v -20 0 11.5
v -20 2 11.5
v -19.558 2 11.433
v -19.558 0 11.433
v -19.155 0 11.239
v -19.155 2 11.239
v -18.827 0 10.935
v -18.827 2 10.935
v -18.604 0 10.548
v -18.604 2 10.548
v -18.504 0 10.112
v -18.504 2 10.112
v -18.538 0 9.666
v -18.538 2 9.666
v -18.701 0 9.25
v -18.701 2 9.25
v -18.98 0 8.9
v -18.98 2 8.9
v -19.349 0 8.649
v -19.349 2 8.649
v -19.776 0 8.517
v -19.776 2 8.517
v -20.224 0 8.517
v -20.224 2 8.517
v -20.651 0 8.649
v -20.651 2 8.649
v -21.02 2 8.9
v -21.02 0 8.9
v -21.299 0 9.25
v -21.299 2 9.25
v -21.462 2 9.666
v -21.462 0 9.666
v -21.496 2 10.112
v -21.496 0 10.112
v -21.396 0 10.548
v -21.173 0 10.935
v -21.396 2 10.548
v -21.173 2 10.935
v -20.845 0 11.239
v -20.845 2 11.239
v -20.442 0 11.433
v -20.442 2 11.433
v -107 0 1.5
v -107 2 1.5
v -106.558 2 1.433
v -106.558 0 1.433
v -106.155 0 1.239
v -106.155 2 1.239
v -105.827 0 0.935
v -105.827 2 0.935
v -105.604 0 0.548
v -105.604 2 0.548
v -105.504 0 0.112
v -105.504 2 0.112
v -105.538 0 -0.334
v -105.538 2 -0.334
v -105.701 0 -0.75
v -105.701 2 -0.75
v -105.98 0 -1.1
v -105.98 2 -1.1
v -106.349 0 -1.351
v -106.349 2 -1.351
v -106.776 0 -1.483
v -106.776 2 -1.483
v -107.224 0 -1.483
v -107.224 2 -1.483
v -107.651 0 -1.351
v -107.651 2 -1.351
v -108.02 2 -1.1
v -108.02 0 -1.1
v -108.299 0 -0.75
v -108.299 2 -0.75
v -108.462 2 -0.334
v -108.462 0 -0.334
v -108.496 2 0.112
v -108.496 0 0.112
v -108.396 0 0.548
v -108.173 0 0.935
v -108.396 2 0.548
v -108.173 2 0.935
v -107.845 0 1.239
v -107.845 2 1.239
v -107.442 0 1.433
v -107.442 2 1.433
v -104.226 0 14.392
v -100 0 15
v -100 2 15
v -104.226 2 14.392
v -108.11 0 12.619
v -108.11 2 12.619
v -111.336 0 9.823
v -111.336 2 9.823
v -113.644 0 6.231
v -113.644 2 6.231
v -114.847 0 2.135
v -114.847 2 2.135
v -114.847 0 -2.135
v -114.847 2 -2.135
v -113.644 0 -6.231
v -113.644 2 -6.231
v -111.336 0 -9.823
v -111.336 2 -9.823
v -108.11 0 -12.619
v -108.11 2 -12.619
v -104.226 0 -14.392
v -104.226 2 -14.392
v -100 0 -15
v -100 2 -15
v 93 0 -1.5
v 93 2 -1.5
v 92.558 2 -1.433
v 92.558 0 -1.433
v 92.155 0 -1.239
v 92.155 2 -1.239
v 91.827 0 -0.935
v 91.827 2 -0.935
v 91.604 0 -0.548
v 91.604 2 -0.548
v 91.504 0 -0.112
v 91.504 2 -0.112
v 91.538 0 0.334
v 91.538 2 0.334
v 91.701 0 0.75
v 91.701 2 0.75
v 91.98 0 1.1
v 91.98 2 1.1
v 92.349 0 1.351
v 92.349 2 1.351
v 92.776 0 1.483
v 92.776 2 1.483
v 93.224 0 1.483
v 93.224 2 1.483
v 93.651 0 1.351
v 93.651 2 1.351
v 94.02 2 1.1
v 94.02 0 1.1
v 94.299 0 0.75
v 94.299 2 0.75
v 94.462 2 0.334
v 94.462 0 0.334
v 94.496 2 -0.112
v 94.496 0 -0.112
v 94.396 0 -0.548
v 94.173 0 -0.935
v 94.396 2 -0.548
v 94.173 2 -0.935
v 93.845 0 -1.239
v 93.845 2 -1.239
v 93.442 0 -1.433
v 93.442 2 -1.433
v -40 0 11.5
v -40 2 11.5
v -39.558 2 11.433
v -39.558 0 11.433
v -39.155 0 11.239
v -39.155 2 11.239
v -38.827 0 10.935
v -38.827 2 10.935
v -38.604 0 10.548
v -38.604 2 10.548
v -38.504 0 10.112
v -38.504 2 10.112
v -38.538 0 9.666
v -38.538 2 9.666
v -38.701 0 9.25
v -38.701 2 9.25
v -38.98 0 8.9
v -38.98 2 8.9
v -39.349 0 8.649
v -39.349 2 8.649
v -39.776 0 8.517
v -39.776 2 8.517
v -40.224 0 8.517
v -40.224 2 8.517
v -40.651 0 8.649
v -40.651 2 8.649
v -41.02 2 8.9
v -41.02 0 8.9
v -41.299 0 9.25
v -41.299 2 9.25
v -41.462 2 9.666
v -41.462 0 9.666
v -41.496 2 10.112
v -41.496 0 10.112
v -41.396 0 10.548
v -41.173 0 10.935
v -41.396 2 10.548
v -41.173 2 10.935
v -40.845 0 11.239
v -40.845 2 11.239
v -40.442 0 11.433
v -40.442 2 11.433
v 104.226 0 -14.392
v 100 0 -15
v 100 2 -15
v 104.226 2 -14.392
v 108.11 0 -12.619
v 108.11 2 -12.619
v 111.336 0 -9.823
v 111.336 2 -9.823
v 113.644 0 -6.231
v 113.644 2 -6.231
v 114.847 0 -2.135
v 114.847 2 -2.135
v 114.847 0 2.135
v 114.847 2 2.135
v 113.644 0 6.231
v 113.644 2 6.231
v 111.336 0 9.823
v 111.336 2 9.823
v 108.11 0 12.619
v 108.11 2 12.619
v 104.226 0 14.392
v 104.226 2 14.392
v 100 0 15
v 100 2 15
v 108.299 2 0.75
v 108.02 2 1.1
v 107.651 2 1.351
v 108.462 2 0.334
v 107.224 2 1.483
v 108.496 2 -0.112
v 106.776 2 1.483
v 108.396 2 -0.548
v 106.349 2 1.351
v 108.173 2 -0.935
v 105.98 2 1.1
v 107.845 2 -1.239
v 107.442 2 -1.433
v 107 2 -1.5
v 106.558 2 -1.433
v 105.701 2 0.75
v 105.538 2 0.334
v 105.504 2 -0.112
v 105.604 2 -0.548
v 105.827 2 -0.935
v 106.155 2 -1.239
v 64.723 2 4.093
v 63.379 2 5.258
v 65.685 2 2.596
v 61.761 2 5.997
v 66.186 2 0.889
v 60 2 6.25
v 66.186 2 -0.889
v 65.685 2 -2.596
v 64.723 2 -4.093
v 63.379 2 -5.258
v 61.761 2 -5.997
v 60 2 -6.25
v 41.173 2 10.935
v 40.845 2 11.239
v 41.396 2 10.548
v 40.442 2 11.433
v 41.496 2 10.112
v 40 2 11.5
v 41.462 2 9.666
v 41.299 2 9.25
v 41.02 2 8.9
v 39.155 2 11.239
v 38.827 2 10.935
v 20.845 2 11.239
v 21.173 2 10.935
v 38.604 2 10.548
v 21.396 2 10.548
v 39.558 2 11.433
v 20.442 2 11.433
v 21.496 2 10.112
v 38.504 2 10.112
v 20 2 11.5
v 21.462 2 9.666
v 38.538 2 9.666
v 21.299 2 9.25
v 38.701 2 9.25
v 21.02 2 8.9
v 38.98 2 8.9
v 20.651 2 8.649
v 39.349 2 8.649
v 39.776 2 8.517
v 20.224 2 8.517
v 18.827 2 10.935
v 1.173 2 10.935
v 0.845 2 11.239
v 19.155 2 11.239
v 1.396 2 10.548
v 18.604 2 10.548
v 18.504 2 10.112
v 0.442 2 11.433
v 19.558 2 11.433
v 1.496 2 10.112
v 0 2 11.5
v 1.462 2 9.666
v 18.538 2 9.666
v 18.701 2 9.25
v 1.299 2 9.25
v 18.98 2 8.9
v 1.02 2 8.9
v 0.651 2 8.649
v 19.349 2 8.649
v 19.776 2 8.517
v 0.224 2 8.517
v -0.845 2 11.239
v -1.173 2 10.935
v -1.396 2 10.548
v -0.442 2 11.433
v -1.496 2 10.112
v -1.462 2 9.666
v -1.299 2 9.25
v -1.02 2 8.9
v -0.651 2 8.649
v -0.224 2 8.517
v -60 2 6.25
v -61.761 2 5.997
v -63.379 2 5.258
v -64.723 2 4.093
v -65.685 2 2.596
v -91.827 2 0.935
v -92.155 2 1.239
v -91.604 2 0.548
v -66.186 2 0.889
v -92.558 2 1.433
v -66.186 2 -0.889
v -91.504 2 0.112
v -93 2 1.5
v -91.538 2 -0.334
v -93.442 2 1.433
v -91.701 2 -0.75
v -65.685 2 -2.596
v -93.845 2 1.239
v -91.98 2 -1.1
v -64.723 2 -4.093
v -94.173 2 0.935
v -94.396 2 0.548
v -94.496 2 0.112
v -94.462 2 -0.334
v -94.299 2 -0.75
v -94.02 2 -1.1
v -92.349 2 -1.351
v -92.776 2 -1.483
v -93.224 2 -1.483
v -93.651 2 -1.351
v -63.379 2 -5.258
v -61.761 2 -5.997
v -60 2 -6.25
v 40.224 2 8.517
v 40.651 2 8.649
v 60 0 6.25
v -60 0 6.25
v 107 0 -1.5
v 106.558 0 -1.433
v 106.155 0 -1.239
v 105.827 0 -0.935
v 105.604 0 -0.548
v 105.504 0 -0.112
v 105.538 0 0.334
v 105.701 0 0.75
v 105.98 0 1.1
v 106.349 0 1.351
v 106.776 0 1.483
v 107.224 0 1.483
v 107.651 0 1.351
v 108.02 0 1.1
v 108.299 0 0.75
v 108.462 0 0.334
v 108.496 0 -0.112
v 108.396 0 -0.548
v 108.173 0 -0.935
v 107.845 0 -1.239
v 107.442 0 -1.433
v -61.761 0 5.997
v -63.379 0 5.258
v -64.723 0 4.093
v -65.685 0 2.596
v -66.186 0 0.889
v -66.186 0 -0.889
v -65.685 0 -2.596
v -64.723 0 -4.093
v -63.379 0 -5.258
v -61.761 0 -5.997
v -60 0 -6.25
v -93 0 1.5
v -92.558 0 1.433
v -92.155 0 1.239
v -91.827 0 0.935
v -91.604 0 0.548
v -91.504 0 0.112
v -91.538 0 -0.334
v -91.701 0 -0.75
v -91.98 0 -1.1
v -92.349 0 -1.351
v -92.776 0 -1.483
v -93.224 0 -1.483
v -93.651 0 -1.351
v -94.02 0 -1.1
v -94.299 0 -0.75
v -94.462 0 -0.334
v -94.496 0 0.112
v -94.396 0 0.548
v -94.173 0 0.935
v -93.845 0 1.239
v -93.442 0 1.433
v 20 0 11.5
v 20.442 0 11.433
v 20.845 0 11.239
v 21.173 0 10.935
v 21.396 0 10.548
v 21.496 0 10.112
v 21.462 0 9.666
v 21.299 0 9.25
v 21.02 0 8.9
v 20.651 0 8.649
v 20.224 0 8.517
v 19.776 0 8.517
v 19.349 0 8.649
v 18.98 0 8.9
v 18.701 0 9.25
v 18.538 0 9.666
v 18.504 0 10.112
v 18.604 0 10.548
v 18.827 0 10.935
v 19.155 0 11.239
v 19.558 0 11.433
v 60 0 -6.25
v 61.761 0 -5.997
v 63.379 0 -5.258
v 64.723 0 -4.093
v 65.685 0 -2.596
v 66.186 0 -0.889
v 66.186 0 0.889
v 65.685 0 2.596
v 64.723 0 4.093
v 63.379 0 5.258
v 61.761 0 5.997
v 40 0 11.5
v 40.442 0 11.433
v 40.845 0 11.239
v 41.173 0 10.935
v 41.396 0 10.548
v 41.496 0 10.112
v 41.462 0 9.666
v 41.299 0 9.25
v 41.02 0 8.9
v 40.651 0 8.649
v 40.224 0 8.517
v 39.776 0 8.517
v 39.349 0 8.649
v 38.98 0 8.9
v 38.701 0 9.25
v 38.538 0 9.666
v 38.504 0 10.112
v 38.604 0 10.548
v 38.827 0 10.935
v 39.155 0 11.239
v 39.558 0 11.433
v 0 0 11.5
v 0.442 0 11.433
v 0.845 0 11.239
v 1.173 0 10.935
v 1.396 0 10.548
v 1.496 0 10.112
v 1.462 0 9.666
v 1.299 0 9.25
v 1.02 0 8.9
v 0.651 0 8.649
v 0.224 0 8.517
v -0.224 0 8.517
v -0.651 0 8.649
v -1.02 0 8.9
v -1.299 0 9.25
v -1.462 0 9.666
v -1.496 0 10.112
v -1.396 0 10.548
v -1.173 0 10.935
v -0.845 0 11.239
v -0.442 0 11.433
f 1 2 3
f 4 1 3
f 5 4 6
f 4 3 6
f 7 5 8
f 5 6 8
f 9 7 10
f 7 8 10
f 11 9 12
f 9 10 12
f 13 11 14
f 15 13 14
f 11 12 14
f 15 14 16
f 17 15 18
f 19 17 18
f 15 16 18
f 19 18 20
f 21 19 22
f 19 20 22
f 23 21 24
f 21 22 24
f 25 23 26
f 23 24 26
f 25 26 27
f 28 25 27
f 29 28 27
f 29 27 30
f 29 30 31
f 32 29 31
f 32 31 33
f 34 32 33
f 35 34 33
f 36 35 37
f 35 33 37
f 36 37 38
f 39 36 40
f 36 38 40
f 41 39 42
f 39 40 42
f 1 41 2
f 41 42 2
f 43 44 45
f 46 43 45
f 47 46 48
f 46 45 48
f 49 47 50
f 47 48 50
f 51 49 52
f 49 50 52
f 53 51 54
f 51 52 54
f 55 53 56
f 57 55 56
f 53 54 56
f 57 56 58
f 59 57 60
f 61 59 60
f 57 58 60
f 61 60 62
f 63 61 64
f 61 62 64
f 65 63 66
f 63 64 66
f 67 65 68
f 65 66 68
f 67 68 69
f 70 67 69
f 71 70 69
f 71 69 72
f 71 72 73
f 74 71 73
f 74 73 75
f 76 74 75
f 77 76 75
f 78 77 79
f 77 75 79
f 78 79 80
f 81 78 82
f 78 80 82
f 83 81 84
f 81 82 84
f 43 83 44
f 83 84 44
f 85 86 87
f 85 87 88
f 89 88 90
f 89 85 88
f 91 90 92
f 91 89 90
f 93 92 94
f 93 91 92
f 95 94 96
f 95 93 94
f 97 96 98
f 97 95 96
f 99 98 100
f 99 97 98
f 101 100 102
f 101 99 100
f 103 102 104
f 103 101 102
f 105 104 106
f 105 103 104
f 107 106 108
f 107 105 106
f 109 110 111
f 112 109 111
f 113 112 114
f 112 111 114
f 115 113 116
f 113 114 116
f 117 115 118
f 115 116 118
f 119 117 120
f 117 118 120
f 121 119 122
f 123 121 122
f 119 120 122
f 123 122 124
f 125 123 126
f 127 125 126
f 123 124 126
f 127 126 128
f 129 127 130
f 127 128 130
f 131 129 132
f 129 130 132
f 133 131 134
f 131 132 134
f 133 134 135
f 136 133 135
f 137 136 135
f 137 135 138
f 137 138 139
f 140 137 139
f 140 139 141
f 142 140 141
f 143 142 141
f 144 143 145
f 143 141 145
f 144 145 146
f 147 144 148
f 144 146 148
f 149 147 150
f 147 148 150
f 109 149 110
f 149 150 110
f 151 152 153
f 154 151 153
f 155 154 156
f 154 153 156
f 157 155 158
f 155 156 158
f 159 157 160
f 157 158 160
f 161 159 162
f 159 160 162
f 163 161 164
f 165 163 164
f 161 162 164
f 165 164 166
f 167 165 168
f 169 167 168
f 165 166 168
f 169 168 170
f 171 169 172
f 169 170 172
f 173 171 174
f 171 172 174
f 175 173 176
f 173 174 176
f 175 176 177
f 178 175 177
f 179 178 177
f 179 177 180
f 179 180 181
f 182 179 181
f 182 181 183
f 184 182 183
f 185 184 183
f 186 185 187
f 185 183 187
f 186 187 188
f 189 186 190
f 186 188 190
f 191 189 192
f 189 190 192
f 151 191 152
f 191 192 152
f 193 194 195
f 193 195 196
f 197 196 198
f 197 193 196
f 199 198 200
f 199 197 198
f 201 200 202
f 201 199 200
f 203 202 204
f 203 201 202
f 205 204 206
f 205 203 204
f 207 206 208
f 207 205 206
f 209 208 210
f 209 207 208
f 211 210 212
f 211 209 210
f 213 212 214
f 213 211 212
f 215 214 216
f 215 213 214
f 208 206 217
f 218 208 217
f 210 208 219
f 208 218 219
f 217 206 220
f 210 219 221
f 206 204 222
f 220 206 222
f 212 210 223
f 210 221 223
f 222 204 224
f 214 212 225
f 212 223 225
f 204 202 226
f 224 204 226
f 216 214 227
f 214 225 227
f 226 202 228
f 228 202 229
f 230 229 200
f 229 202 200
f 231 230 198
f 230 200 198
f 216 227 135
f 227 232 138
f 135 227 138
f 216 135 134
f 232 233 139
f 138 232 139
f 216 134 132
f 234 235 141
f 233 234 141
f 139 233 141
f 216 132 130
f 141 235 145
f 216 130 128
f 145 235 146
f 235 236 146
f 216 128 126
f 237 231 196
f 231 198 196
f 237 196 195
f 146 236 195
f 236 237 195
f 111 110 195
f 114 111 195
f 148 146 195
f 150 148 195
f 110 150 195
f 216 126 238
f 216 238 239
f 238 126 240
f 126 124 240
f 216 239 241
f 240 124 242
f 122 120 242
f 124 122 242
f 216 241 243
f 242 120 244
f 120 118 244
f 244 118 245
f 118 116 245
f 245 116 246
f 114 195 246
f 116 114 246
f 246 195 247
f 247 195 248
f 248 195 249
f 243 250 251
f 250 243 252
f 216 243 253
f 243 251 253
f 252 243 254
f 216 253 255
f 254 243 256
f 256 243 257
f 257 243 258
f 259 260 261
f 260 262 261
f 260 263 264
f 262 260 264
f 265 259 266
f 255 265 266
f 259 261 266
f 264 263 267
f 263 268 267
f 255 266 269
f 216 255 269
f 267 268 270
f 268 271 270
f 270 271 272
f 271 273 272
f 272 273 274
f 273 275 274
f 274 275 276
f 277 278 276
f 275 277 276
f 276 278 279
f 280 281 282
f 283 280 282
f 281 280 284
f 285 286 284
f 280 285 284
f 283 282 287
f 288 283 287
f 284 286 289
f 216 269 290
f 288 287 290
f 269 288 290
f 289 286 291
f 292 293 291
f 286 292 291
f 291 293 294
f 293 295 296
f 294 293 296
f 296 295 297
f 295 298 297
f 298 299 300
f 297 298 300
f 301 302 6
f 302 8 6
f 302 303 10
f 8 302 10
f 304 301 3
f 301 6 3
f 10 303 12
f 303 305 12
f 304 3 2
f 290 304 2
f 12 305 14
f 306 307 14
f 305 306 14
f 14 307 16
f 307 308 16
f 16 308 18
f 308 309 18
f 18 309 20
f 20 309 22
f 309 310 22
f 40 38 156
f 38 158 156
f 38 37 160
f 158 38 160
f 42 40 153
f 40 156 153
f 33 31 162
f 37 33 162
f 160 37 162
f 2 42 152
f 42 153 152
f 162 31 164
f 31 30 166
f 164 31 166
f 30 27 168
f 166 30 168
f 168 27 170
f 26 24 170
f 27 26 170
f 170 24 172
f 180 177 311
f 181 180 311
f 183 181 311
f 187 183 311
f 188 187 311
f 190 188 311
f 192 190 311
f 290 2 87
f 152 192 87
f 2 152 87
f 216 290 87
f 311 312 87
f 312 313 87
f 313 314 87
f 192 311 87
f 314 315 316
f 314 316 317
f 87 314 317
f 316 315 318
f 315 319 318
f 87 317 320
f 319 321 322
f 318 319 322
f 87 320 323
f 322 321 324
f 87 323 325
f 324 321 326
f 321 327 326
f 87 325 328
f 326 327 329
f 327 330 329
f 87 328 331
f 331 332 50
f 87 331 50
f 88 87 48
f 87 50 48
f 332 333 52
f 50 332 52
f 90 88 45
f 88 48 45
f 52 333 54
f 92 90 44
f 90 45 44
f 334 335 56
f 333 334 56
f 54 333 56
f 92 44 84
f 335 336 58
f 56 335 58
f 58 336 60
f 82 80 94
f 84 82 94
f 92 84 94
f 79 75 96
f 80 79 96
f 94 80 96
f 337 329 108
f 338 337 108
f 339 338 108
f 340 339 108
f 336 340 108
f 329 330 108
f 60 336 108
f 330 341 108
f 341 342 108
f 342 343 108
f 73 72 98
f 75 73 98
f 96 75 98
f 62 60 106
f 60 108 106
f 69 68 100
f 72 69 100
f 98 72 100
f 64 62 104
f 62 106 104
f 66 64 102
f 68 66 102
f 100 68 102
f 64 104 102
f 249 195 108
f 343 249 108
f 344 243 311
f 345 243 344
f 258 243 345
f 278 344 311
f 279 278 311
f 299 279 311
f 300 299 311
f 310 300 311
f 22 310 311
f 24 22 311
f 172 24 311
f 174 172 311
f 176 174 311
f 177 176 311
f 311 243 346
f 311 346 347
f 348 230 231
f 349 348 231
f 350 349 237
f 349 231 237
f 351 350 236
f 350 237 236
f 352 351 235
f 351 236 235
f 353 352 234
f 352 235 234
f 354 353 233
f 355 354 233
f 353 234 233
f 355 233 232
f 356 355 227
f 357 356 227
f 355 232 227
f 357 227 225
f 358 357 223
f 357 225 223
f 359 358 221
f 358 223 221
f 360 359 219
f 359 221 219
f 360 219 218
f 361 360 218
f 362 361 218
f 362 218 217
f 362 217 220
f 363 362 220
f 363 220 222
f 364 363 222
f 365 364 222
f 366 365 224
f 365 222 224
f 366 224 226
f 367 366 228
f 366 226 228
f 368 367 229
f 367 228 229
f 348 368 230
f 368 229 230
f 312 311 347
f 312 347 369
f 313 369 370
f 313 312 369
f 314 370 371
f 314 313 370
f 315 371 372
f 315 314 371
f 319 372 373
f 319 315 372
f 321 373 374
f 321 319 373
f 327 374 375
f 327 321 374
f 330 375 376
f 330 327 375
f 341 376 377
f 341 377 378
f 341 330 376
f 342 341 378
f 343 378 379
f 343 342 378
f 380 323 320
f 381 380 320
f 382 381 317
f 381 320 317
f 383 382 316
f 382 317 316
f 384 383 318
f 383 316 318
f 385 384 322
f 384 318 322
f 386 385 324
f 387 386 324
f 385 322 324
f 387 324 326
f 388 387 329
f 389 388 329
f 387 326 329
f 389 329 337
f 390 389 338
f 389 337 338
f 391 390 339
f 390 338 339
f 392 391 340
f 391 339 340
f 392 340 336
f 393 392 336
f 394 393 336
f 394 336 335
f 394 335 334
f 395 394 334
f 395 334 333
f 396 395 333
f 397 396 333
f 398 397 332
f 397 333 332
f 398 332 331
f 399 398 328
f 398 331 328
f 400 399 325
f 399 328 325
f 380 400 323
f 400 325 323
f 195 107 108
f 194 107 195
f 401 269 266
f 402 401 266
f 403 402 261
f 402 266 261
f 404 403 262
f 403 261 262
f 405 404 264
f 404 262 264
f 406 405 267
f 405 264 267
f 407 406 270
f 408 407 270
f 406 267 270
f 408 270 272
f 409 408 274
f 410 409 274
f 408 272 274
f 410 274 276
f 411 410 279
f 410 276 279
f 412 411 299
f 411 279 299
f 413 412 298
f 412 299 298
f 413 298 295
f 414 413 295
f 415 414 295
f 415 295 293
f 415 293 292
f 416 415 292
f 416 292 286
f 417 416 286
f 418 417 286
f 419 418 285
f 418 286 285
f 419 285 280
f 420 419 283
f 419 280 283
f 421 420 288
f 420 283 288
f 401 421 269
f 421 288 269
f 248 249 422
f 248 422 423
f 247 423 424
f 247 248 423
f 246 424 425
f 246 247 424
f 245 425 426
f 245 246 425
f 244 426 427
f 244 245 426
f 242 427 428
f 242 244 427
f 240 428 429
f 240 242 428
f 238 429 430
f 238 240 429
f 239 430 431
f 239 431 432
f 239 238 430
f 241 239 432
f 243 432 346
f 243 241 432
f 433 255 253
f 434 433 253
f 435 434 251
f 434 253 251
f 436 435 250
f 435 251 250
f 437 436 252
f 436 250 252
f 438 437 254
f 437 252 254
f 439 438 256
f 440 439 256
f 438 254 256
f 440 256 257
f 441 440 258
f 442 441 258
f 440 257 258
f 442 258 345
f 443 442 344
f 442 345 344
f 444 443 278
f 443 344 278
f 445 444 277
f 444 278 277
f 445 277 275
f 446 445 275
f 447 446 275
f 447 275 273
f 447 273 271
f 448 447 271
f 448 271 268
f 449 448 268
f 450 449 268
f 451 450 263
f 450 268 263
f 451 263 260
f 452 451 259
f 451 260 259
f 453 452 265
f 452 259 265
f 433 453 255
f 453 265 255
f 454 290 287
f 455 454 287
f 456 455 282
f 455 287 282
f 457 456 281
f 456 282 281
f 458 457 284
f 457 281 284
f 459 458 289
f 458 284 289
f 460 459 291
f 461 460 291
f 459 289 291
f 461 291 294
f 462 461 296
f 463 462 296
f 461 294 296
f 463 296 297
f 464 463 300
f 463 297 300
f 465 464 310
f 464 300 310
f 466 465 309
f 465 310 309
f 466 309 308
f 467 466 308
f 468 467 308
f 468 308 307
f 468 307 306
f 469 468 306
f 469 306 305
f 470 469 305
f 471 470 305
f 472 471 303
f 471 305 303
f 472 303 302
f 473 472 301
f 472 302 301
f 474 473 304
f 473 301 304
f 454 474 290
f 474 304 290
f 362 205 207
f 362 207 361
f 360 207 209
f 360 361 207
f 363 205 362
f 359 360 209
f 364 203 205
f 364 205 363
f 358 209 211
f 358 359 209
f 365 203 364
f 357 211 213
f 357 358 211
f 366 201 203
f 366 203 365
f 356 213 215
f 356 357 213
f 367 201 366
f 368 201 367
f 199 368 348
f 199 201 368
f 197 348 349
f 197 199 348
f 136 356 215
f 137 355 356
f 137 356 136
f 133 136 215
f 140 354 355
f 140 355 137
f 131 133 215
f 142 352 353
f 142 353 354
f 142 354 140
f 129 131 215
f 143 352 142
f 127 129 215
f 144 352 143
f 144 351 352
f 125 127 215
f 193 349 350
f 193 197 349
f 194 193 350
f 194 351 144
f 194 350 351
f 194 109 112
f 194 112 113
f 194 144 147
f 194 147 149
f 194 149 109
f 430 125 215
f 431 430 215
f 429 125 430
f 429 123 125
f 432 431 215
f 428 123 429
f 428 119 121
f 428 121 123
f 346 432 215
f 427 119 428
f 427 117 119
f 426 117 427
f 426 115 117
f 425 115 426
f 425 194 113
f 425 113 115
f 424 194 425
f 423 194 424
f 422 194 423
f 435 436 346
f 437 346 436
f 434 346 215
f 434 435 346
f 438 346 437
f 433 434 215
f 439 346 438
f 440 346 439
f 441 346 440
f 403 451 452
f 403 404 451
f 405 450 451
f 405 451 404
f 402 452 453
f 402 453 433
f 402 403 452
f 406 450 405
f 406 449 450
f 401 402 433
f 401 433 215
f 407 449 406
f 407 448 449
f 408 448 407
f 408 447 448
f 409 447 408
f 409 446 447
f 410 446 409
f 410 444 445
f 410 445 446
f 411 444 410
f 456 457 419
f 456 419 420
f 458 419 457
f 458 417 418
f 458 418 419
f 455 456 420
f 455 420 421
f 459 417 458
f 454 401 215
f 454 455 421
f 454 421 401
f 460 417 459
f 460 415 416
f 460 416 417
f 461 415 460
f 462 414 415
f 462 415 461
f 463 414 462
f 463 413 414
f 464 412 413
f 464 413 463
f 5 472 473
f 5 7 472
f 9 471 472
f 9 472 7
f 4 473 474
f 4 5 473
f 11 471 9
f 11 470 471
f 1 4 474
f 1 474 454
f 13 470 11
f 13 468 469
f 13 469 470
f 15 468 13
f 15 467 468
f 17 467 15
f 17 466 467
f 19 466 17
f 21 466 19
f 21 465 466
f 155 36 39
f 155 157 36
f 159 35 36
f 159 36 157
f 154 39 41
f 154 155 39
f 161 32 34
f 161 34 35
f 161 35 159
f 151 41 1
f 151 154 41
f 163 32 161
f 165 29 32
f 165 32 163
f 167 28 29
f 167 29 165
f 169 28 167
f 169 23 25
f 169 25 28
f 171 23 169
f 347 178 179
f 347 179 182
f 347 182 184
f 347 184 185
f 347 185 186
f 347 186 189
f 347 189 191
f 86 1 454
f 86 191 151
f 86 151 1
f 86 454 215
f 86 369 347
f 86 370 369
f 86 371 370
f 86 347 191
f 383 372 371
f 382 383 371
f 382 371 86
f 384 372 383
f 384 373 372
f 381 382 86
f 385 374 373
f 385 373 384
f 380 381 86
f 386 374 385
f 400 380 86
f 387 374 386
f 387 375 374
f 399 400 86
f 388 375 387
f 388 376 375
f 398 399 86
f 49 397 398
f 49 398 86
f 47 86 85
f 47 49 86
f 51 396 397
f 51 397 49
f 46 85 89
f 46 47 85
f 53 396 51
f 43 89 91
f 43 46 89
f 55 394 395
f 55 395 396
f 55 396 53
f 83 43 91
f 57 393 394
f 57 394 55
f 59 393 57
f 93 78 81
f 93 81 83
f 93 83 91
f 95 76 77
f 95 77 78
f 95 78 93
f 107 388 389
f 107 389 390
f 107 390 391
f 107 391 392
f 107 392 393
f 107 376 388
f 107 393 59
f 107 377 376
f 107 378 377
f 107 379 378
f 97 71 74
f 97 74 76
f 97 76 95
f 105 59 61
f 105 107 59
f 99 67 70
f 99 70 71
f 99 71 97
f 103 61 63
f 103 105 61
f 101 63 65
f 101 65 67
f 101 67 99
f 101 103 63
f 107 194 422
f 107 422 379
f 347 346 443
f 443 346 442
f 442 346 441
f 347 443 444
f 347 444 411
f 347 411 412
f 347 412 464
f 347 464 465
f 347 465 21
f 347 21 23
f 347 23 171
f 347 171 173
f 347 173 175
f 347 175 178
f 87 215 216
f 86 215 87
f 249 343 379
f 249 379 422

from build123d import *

# Parameters (mm, degrees)
EXTRUDE_1_DEPTH     = 2
SKETCH_4_R          = 1.5
CUT_EXTRUDE_1_DEPTH = 2


with BuildPart() as part:
    # 草图1 → 凸台-拉伸1 (new body)
    with BuildSketch(Plane(origin=(0, 0, 0), x_dir=(1, 0, 0), z_dir=(0, 1, 0))):
        with BuildLine():
            Line((-100, 15), (100, 15))
            ThreePointArc((100, 15), (115, 0), (100, -15))
            Line((100, -15), (-100, -15))
            ThreePointArc((-100, -15), (-115, 0), (-100, 15))
        make_face()
    extrude(amount=EXTRUDE_1_DEPTH)

    # 草图4 → 切除-拉伸1 (cut)
    with BuildSketch(Plane(origin=(0, 2, 0), x_dir=(1, 0, 0), z_dir=(0, 1, 0))):
        with Locations(Location((-107, 0, 0), (0, 0, 270))):
            Circle(SKETCH_4_R)
        with Locations(Location((-93, 0, 0), (0, 0, 270))):
            Circle(SKETCH_4_R)
        with Locations(Location((107, 0, 0), (0, 0, 90))):
            Circle(SKETCH_4_R)
        with Locations(Location((93, 0, 0), (0, 0, 90))):
            Circle(SKETCH_4_R)
        with Locations(Location((0, -10, 0), (0, 0, 270))):
            Circle(SKETCH_4_R)
        with Locations(Location((20, -10, 0), (0, 0, 270))):
            Circle(SKETCH_4_R)
        with Locations(Location((40, -10, 0), (0, 0, 270))):
            Circle(SKETCH_4_R)
        with Locations(Location((-20, -10, 0), (0, 0, 270))):
            Circle(SKETCH_4_R)
        with Locations(Location((-40, -10, 0), (0, 0, 270))):
            Circle(SKETCH_4_R)
        with BuildLine():
            Line((-60, 6.25), (60, 6.25))
            ThreePointArc((60, 6.25), (66.25, 0), (60, -6.25))
            Line((60, -6.25), (-60, -6.25))
            ThreePointArc((-60, -6.25), (-66.25, 0), (-60, 6.25))
        make_face()
    extrude(amount=-CUT_EXTRUDE_1_DEPTH, mode=Mode.SUBTRACT)


solid = part.part
